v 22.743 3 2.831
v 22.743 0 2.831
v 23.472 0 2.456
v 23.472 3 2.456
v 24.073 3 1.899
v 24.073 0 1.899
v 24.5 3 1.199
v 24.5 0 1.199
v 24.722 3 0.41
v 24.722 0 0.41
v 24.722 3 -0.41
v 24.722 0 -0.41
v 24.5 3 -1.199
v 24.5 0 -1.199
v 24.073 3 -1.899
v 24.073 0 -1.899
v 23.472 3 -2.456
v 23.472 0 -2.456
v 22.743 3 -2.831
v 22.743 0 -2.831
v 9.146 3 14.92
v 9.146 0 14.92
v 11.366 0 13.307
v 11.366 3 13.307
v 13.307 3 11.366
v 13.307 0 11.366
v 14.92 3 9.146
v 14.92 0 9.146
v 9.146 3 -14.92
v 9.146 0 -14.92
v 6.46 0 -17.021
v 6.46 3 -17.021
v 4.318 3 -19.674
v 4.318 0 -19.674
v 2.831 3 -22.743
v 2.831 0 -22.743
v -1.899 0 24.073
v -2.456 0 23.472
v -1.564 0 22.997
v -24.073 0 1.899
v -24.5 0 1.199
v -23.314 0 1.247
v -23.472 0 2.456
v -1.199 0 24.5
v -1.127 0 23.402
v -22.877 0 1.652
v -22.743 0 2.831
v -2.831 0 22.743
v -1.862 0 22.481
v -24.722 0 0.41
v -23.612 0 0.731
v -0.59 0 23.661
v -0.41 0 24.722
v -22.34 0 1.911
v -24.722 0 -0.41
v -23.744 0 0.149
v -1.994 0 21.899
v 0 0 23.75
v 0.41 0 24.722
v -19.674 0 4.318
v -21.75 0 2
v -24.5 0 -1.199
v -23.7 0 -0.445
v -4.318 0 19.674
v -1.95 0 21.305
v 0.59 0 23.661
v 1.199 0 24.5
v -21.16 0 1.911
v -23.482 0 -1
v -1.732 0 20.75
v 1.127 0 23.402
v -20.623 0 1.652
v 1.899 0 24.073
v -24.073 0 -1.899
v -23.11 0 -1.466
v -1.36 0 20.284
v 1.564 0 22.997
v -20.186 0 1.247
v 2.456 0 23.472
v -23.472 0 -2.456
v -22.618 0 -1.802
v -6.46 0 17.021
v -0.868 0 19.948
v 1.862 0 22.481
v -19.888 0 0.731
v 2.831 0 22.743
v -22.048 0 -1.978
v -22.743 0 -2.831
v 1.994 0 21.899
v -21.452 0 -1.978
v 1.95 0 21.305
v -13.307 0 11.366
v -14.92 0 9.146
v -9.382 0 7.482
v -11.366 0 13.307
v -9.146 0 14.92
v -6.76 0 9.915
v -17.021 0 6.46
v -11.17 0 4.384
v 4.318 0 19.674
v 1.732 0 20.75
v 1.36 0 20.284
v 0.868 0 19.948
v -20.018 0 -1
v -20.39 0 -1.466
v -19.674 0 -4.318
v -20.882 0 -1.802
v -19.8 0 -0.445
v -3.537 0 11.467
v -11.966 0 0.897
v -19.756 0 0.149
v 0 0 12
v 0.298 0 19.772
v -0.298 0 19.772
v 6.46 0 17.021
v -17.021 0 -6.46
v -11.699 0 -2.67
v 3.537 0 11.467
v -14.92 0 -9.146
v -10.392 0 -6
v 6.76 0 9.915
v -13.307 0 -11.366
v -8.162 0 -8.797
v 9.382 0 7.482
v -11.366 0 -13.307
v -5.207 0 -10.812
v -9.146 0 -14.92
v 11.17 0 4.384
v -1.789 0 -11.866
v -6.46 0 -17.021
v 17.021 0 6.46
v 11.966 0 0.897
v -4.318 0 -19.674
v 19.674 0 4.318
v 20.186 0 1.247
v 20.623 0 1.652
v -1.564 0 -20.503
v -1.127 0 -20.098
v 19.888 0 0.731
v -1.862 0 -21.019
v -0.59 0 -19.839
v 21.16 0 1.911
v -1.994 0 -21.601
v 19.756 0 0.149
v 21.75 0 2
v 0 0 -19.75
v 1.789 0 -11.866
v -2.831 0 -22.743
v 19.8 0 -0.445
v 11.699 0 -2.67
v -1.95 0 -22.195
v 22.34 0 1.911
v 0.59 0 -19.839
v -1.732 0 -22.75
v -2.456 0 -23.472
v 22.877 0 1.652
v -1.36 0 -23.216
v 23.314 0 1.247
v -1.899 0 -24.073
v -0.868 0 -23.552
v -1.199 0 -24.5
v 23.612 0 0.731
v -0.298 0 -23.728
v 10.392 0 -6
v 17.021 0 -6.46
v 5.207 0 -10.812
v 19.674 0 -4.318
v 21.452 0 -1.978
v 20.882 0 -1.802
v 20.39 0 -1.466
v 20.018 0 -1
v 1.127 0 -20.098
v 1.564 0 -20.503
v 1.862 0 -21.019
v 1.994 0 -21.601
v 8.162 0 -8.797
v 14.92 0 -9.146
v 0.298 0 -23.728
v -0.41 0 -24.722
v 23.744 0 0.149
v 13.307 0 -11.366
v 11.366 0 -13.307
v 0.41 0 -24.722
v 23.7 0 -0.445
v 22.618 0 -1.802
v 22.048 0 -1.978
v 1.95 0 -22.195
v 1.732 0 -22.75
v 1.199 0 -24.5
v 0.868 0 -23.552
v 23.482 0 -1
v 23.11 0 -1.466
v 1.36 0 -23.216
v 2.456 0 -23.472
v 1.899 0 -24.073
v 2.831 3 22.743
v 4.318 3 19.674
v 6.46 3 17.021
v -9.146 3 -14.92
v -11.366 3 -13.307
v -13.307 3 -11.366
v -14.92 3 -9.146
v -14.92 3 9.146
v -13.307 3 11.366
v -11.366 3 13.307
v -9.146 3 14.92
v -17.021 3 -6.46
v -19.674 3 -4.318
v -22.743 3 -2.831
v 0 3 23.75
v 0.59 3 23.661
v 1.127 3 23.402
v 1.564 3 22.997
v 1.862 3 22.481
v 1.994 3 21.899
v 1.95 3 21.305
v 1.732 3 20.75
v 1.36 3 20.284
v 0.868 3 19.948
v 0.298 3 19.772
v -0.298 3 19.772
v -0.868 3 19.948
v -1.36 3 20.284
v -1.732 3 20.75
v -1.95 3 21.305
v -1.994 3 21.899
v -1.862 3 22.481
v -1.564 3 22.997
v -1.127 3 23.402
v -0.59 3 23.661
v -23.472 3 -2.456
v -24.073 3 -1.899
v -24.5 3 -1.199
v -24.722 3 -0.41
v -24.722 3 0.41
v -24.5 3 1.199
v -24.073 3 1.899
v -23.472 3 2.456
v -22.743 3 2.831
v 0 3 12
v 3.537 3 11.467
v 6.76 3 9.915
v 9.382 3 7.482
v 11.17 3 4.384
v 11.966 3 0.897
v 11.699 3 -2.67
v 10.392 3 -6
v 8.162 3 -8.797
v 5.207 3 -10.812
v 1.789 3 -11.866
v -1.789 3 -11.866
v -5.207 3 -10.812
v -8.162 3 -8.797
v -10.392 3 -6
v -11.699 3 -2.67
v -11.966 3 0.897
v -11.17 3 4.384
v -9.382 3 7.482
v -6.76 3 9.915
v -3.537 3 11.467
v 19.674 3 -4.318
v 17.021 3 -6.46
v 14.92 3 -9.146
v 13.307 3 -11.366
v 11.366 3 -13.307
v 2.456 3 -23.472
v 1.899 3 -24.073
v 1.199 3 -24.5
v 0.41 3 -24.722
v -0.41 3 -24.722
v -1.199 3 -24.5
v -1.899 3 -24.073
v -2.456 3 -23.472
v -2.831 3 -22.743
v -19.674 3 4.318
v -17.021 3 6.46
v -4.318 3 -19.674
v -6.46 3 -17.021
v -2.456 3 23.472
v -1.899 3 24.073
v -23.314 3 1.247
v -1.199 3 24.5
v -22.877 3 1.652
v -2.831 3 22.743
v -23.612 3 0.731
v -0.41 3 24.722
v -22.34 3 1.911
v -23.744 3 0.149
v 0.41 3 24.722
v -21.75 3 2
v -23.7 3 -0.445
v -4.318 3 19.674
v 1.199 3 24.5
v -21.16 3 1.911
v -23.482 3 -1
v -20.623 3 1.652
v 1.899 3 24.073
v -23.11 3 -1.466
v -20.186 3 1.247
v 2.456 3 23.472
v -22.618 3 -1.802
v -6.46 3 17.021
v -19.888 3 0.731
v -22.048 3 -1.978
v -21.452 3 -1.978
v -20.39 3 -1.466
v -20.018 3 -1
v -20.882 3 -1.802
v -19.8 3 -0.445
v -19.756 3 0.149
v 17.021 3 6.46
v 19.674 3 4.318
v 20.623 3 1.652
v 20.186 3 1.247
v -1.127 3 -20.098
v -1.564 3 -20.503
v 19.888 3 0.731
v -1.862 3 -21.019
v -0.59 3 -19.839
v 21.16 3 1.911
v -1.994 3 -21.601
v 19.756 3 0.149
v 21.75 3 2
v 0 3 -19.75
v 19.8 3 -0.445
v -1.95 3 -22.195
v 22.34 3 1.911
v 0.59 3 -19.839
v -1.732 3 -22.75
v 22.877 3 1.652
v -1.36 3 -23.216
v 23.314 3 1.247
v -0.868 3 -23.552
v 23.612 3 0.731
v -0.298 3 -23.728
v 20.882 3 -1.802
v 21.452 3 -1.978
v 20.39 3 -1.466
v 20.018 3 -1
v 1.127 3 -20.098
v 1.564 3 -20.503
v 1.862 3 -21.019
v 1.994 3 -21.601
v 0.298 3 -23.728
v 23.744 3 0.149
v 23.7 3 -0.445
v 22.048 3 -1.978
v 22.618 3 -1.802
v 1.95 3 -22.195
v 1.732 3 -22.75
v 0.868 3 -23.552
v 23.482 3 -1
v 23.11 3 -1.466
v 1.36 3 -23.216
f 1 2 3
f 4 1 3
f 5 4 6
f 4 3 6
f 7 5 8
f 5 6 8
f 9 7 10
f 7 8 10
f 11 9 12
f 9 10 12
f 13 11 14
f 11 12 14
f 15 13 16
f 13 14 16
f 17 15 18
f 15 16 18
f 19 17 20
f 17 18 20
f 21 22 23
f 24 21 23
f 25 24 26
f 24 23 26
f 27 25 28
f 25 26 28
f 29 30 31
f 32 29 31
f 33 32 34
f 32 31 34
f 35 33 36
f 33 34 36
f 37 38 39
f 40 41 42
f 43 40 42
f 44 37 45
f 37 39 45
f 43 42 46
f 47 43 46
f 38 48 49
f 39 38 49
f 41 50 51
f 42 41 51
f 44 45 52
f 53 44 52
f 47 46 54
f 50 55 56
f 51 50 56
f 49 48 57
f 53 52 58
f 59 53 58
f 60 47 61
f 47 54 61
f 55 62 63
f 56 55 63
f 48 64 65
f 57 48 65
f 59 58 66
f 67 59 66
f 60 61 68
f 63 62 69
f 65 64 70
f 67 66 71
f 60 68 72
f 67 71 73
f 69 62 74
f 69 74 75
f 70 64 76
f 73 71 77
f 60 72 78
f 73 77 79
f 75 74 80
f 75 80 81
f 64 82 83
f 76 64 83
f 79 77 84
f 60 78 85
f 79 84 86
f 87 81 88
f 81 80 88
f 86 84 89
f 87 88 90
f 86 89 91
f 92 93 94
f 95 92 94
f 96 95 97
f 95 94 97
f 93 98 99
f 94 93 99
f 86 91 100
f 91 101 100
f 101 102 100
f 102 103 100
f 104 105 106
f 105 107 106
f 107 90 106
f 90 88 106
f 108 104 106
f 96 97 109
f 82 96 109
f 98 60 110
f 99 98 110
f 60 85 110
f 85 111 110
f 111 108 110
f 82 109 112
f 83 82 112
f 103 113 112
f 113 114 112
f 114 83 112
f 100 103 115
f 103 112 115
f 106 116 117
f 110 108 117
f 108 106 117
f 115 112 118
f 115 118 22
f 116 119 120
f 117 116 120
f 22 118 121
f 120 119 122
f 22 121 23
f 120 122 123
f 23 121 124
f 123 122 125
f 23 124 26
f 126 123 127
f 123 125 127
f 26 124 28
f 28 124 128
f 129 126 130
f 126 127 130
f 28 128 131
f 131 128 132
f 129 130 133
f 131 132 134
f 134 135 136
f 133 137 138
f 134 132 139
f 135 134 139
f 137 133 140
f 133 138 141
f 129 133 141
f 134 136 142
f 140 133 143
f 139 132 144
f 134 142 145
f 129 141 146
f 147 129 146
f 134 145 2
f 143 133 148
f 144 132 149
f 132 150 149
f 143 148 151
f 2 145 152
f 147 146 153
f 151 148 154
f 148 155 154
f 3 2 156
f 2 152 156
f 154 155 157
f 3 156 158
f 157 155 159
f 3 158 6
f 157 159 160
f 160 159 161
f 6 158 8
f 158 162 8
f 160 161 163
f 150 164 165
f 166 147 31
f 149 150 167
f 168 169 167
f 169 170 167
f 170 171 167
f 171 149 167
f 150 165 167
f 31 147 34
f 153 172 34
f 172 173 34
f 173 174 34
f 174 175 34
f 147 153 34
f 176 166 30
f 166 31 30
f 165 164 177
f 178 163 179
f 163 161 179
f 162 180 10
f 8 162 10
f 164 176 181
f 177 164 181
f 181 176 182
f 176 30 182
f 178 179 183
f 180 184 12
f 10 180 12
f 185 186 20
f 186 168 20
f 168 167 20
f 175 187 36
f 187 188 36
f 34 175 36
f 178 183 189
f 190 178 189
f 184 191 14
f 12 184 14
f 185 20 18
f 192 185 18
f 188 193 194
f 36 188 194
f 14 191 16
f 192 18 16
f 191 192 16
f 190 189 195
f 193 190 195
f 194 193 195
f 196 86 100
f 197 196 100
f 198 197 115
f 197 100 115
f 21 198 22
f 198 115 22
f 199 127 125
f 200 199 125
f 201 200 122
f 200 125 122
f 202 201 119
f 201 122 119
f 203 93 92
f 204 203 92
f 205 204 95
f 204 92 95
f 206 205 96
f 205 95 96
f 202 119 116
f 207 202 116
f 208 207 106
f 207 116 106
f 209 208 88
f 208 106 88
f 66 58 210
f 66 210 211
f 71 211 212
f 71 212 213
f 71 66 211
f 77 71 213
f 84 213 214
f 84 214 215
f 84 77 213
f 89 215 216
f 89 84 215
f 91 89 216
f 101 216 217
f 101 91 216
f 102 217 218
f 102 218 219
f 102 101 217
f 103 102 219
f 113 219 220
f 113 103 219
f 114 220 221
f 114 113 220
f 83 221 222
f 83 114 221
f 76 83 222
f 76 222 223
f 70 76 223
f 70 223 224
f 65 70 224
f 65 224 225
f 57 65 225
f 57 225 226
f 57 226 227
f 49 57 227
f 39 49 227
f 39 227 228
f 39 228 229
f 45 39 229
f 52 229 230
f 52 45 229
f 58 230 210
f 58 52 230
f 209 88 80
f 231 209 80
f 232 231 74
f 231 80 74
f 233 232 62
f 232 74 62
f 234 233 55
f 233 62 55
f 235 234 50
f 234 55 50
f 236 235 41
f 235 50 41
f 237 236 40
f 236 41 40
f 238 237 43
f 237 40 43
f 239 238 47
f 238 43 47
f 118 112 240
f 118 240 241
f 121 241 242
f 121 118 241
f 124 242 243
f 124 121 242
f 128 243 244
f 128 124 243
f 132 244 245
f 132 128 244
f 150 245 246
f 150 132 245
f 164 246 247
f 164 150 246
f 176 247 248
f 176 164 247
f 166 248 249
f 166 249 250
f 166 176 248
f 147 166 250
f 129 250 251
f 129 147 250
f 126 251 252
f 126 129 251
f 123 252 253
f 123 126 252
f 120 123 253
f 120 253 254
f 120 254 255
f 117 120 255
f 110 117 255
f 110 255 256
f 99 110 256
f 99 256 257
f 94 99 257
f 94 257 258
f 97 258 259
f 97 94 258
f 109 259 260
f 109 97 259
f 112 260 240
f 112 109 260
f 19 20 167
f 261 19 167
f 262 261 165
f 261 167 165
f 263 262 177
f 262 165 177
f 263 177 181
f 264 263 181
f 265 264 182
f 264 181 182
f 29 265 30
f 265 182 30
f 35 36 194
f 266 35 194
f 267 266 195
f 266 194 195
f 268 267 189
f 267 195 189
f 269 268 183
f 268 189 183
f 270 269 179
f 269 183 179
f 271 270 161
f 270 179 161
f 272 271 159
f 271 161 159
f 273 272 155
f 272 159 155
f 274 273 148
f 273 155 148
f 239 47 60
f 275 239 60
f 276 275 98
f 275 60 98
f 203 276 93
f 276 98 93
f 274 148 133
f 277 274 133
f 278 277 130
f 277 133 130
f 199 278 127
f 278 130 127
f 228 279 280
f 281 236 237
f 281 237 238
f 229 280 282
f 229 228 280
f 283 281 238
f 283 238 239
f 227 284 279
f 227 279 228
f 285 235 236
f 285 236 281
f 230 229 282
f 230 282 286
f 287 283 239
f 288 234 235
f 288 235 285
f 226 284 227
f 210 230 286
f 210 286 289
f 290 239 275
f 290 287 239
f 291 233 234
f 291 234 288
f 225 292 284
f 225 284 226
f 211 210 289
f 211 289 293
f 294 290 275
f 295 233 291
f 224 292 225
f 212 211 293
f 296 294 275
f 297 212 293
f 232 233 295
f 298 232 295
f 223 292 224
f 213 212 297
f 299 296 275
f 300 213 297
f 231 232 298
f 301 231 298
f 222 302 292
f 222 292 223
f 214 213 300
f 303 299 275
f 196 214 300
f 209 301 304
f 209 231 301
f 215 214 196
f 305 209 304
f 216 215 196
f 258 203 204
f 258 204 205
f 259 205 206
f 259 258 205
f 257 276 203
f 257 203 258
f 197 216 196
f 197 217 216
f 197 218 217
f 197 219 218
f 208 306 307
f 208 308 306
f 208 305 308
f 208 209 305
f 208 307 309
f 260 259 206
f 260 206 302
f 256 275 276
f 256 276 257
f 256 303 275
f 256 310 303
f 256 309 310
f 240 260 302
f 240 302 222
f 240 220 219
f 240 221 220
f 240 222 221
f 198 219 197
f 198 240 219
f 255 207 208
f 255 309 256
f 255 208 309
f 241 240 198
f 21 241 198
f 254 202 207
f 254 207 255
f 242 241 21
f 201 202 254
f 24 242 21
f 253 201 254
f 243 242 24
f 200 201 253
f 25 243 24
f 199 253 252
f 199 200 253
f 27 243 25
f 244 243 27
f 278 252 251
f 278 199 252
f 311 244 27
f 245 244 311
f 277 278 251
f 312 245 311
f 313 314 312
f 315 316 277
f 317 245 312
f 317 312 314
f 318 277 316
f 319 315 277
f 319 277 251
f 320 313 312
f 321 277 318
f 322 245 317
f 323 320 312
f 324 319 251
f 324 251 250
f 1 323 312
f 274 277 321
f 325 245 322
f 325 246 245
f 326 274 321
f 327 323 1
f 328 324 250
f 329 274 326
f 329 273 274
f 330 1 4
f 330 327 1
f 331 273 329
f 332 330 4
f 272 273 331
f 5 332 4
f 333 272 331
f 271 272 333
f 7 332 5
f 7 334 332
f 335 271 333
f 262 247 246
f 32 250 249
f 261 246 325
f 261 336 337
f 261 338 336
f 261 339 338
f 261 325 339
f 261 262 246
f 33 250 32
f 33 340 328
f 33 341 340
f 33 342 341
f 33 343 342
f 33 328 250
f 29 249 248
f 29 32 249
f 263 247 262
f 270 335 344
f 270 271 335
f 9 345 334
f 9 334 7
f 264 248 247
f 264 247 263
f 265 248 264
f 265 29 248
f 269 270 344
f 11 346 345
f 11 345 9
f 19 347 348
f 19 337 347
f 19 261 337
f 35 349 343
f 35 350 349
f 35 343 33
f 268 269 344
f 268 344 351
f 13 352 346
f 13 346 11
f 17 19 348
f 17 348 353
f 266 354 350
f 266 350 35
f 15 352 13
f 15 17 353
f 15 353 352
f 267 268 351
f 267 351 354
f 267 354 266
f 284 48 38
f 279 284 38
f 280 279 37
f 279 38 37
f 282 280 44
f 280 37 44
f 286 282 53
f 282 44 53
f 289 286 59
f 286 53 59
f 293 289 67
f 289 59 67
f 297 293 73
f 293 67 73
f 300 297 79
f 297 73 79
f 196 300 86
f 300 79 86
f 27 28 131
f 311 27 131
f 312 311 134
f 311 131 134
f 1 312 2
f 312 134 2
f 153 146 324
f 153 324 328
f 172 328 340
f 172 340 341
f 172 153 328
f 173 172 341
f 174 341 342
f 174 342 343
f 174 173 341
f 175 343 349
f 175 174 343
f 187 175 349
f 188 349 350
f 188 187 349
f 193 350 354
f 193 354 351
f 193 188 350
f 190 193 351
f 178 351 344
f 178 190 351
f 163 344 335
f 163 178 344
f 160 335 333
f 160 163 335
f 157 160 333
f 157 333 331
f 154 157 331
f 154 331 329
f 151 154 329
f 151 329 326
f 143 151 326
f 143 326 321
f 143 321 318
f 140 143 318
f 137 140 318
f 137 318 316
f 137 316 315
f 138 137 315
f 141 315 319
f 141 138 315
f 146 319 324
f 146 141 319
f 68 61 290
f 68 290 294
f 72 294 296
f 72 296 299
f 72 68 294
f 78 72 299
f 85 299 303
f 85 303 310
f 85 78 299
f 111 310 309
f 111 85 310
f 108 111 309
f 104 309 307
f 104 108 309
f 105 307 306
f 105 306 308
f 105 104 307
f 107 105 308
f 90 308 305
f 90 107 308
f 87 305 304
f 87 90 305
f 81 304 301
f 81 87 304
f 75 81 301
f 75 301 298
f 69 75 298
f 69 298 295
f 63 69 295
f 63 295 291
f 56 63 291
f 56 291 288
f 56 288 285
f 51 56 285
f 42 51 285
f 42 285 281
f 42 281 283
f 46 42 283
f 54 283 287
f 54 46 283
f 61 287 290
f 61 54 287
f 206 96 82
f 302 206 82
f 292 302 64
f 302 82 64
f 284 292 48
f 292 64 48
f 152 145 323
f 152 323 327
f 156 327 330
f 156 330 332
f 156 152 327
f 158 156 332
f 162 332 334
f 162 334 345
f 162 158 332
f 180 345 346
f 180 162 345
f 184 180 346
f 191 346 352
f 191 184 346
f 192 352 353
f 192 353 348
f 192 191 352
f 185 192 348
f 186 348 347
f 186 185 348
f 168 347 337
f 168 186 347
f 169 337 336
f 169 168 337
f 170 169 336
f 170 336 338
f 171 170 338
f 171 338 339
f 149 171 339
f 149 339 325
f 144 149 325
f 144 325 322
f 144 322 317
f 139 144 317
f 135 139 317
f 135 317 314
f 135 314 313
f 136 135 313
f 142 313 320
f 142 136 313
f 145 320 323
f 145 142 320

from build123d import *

# Parameters (mm, degrees)
SKETCH_1_R      = 12
SKETCH_1_R_2    = 2
EXTRUDE_1_DEPTH = 3


with BuildPart() as part:
    # ｽｹｯﾁ1 → ﾎﾞｽ - 押し出し1 (new body)
    with BuildSketch(Plane(origin=(0, 0, 0), x_dir=(1, 0, 0), z_dir=(0, 1, 0))):
        with BuildLine():
            ThreePointArc((-9.145896655, 14.919871795), (-12.374368671, 12.374368671), (-14.919871795, 9.145896655))
            ThreePointArc((-14.919871795, 9.145896655), (-18.286619233, 5.313420016), (-22.743055556, 2.830872774))
            ThreePointArc((-22.743055556, 2.830872774), (-24.75, 0), (-22.743055556, -2.830872774))
            ThreePointArc((-22.743055556, -2.830872774), (-18.286619233, -5.313420016), (-14.919871795, -9.145896655))
            ThreePointArc((-14.919871795, -9.145896655), (-12.374368671, -12.374368671), (-9.145896655, -14.919871795))
            ThreePointArc((-9.145896655, -14.919871795), (-5.313420016, -18.286619233), (-2.830872774, -22.743055556))
            ThreePointArc((-2.830872774, -22.743055556), (0, -24.75), (2.830872774, -22.743055556))
            ThreePointArc((2.830872774, -22.743055556), (5.313420016, -18.286619233), (9.145896655, -14.919871795))
            ThreePointArc((9.145896655, -14.919871795), (12.374368671, -12.374368671), (14.919871795, -9.145896655))
            ThreePointArc((14.919871795, -9.145896655), (18.286619233, -5.313420016), (22.743055556, -2.830872774))
            ThreePointArc((22.743055556, -2.830872774), (24.75, 0), (22.743055556, 2.830872774))
            ThreePointArc((22.743055556, 2.830872774), (18.286619233, 5.313420016), (14.919871795, 9.145896655))
            ThreePointArc((14.919871795, 9.145896655), (12.374368671, 12.374368671), (9.145896655, 14.919871795))
            ThreePointArc((9.145896655, 14.919871795), (5.313420016, 18.286619233), (2.830872774, 22.743055556))
            ThreePointArc((2.830872774, 22.743055556), (0, 24.75), (-2.830872774, 22.743055556))
            ThreePointArc((-2.830872774, 22.743055556), (-5.313420016, 18.286619233), (-9.145896655, 14.919871795))
        make_face()
        with Locations(Location((0, 0, 0), (0, 0, 270))):
            Circle(SKETCH_1_R, mode=Mode.SUBTRACT)
        with Locations(Location((0, 21.75, 0), (0, 0, 270))):
            Circle(SKETCH_1_R_2, mode=Mode.SUBTRACT)
        with Locations(Location((21.75, 0, 0), (0, 0, 270))):
            Circle(SKETCH_1_R_2, mode=Mode.SUBTRACT)
        with Locations(Location((0, -21.75, 0), (0, 0, 270))):
            Circle(SKETCH_1_R_2, mode=Mode.SUBTRACT)
        with Locations(Location((-21.75, 0, 0), (0, 0, 270))):
            Circle(SKETCH_1_R_2, mode=Mode.SUBTRACT)
    extrude(amount=EXTRUDE_1_DEPTH)


solid = part.part
